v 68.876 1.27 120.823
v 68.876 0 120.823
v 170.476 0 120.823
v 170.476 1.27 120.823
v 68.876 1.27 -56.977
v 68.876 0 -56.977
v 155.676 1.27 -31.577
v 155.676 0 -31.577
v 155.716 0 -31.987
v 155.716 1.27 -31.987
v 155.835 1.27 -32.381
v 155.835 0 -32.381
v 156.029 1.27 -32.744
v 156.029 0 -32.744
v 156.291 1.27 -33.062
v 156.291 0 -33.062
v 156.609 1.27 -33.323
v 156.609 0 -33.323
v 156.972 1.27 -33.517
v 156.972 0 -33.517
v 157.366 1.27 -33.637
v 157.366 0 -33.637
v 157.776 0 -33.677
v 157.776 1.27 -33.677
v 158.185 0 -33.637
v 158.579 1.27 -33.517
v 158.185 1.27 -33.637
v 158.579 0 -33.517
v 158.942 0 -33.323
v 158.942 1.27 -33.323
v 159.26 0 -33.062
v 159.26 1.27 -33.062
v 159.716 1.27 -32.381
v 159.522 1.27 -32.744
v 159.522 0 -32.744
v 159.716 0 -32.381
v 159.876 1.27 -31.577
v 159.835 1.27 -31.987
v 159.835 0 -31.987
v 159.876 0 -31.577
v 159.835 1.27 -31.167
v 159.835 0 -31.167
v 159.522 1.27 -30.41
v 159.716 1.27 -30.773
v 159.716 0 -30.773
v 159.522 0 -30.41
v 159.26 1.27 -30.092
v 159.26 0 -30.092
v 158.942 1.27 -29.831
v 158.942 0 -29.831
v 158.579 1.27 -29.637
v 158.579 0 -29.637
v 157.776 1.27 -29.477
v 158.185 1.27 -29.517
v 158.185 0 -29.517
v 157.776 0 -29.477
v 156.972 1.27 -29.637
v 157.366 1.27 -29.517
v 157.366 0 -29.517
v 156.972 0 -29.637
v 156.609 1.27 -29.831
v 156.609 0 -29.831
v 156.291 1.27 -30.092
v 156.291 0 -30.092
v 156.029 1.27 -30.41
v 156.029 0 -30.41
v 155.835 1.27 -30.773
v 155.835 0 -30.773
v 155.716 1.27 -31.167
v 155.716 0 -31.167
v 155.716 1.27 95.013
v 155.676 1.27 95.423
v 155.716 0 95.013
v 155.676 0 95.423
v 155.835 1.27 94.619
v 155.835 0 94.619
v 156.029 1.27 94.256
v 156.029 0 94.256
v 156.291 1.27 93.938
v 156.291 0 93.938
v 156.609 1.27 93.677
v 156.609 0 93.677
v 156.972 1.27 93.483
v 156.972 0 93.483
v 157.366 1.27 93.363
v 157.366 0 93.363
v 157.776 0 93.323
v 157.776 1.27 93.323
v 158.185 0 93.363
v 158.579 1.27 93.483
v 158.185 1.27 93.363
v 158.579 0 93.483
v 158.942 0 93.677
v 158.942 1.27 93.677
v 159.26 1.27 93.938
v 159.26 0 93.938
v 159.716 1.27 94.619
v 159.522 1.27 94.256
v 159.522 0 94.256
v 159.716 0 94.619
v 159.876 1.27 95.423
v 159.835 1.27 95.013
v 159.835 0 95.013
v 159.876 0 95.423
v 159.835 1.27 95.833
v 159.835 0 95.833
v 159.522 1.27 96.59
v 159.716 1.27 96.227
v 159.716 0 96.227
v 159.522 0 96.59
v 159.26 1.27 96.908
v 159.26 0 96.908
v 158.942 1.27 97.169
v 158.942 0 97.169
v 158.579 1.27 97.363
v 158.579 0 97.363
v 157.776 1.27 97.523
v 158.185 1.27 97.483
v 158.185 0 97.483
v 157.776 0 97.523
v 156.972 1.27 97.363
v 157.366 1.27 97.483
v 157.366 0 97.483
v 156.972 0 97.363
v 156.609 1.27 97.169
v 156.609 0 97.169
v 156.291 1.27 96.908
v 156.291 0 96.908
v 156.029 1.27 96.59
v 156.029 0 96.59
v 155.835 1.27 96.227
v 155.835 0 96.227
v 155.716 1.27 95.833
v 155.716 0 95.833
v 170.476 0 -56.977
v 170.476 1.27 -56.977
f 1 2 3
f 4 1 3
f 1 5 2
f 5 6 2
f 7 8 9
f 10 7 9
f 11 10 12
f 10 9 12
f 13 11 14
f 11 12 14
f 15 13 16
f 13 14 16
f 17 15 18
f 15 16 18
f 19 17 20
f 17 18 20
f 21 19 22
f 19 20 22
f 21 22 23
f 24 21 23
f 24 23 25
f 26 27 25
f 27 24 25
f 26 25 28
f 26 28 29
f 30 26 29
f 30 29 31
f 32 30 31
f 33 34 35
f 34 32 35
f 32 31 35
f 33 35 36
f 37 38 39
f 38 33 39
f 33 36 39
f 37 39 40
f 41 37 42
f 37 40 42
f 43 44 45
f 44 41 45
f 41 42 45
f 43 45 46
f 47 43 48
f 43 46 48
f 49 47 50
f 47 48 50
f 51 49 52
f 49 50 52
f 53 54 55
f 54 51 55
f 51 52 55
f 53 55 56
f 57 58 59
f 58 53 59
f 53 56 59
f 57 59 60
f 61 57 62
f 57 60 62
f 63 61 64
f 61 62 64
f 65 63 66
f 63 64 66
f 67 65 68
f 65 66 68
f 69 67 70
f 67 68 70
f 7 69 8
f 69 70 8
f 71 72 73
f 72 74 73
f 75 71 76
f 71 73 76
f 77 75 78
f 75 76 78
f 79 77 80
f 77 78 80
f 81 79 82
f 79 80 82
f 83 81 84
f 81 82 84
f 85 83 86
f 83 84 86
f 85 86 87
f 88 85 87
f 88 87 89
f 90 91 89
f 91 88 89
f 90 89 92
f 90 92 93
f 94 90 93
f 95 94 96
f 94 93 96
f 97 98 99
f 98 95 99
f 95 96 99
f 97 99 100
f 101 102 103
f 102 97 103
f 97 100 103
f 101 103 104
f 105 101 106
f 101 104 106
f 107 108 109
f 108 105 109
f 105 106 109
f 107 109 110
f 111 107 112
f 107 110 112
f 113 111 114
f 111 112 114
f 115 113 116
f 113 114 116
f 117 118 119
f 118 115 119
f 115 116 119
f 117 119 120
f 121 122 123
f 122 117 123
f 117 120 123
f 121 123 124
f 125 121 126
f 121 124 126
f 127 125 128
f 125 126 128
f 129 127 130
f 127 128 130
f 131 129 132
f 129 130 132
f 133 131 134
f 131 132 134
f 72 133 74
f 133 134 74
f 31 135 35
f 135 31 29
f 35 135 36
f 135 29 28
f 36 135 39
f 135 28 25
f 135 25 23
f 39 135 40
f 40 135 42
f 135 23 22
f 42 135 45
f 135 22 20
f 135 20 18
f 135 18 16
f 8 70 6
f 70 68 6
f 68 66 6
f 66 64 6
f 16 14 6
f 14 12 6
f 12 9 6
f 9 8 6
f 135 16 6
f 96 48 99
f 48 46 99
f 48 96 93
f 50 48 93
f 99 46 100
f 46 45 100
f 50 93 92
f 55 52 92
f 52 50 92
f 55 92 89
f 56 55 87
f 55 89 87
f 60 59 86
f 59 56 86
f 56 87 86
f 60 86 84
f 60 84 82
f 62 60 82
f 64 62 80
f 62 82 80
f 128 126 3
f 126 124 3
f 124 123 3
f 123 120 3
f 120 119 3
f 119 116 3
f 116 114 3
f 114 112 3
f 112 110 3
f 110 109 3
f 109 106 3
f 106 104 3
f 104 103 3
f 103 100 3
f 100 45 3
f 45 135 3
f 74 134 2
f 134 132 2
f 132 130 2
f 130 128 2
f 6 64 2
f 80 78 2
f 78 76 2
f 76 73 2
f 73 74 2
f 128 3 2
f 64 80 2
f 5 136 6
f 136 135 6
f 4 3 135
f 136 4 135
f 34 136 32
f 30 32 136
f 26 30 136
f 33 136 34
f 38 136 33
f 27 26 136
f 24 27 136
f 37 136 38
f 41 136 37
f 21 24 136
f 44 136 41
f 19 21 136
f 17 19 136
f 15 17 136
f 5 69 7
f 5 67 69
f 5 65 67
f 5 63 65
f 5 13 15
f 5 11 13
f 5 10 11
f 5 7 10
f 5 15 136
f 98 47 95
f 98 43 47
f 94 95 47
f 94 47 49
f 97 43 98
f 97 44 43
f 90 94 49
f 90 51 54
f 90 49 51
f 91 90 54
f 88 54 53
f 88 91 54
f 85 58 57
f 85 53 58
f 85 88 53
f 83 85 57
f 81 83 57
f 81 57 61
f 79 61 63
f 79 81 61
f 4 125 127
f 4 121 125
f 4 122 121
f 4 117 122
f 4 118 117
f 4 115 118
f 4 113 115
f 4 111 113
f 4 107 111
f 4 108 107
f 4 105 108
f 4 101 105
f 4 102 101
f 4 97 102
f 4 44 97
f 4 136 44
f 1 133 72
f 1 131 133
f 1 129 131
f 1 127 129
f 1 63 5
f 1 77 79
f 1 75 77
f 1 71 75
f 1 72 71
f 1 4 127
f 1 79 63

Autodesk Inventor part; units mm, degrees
ref_plane "YZ Plane" through (0, 0, 0) normal (1, 0, 0) x (0, 1, 0)
ref_plane "XZ Plane" through (0, 0, 0) normal (0, 1, 0) x (-1, 0, 0)
ref_plane "XY Plane" through (0, 0, 0) normal (0, 0, 1) x (1, 0, 0)
sketch "Sketch1" plane through (0, 0, 0) normal (0, 1, 0) x (-1, 0, 0)
  line L0 (-68.8755, 120.8229) -> (-170.4755, 120.8229)
  line L1 (-170.4755, 120.8229) -> (-170.4755, -56.9771)
  line L2 (-170.4755, -56.9771) -> (-68.8755, -56.9771)
  line L3 (-68.8755, -56.9771) -> (-68.8755, 120.8229)
  circle A0 centre (-157.7755, 95.4229) radius 2.1
  circle A1 centre (-157.7755, -31.5771) radius 2.1
  point P0 (0, 0)
  dimension "d0" = 101.6
  dimension "d1" = 177.8
  dimension "d15" = 127
  dimension "d16" = 12.7
  dimension "d17" = 25.4
  dimension "d18" = 12.7
extrude "Extrusion2" add sketch "Sketch1" along normal blind 1.27
sketch "Sketch2" plane through (0, 1.27, 0) normal (0, 1, 0) x (1, 0, 0)
  line L0 (74.1152, -103.7053) -> (74.1152, 40.0772) construction
  line L1 (74.1152, 40.0772) -> (152.1963, 40.0772) construction
  line L2 (152.1963, 40.0772) -> (152.1963, -103.7053) construction
  line L3 (152.1963, -103.7053) -> (74.1152, -103.7053) construction
properties part number "Plexiglass number plate 2"
